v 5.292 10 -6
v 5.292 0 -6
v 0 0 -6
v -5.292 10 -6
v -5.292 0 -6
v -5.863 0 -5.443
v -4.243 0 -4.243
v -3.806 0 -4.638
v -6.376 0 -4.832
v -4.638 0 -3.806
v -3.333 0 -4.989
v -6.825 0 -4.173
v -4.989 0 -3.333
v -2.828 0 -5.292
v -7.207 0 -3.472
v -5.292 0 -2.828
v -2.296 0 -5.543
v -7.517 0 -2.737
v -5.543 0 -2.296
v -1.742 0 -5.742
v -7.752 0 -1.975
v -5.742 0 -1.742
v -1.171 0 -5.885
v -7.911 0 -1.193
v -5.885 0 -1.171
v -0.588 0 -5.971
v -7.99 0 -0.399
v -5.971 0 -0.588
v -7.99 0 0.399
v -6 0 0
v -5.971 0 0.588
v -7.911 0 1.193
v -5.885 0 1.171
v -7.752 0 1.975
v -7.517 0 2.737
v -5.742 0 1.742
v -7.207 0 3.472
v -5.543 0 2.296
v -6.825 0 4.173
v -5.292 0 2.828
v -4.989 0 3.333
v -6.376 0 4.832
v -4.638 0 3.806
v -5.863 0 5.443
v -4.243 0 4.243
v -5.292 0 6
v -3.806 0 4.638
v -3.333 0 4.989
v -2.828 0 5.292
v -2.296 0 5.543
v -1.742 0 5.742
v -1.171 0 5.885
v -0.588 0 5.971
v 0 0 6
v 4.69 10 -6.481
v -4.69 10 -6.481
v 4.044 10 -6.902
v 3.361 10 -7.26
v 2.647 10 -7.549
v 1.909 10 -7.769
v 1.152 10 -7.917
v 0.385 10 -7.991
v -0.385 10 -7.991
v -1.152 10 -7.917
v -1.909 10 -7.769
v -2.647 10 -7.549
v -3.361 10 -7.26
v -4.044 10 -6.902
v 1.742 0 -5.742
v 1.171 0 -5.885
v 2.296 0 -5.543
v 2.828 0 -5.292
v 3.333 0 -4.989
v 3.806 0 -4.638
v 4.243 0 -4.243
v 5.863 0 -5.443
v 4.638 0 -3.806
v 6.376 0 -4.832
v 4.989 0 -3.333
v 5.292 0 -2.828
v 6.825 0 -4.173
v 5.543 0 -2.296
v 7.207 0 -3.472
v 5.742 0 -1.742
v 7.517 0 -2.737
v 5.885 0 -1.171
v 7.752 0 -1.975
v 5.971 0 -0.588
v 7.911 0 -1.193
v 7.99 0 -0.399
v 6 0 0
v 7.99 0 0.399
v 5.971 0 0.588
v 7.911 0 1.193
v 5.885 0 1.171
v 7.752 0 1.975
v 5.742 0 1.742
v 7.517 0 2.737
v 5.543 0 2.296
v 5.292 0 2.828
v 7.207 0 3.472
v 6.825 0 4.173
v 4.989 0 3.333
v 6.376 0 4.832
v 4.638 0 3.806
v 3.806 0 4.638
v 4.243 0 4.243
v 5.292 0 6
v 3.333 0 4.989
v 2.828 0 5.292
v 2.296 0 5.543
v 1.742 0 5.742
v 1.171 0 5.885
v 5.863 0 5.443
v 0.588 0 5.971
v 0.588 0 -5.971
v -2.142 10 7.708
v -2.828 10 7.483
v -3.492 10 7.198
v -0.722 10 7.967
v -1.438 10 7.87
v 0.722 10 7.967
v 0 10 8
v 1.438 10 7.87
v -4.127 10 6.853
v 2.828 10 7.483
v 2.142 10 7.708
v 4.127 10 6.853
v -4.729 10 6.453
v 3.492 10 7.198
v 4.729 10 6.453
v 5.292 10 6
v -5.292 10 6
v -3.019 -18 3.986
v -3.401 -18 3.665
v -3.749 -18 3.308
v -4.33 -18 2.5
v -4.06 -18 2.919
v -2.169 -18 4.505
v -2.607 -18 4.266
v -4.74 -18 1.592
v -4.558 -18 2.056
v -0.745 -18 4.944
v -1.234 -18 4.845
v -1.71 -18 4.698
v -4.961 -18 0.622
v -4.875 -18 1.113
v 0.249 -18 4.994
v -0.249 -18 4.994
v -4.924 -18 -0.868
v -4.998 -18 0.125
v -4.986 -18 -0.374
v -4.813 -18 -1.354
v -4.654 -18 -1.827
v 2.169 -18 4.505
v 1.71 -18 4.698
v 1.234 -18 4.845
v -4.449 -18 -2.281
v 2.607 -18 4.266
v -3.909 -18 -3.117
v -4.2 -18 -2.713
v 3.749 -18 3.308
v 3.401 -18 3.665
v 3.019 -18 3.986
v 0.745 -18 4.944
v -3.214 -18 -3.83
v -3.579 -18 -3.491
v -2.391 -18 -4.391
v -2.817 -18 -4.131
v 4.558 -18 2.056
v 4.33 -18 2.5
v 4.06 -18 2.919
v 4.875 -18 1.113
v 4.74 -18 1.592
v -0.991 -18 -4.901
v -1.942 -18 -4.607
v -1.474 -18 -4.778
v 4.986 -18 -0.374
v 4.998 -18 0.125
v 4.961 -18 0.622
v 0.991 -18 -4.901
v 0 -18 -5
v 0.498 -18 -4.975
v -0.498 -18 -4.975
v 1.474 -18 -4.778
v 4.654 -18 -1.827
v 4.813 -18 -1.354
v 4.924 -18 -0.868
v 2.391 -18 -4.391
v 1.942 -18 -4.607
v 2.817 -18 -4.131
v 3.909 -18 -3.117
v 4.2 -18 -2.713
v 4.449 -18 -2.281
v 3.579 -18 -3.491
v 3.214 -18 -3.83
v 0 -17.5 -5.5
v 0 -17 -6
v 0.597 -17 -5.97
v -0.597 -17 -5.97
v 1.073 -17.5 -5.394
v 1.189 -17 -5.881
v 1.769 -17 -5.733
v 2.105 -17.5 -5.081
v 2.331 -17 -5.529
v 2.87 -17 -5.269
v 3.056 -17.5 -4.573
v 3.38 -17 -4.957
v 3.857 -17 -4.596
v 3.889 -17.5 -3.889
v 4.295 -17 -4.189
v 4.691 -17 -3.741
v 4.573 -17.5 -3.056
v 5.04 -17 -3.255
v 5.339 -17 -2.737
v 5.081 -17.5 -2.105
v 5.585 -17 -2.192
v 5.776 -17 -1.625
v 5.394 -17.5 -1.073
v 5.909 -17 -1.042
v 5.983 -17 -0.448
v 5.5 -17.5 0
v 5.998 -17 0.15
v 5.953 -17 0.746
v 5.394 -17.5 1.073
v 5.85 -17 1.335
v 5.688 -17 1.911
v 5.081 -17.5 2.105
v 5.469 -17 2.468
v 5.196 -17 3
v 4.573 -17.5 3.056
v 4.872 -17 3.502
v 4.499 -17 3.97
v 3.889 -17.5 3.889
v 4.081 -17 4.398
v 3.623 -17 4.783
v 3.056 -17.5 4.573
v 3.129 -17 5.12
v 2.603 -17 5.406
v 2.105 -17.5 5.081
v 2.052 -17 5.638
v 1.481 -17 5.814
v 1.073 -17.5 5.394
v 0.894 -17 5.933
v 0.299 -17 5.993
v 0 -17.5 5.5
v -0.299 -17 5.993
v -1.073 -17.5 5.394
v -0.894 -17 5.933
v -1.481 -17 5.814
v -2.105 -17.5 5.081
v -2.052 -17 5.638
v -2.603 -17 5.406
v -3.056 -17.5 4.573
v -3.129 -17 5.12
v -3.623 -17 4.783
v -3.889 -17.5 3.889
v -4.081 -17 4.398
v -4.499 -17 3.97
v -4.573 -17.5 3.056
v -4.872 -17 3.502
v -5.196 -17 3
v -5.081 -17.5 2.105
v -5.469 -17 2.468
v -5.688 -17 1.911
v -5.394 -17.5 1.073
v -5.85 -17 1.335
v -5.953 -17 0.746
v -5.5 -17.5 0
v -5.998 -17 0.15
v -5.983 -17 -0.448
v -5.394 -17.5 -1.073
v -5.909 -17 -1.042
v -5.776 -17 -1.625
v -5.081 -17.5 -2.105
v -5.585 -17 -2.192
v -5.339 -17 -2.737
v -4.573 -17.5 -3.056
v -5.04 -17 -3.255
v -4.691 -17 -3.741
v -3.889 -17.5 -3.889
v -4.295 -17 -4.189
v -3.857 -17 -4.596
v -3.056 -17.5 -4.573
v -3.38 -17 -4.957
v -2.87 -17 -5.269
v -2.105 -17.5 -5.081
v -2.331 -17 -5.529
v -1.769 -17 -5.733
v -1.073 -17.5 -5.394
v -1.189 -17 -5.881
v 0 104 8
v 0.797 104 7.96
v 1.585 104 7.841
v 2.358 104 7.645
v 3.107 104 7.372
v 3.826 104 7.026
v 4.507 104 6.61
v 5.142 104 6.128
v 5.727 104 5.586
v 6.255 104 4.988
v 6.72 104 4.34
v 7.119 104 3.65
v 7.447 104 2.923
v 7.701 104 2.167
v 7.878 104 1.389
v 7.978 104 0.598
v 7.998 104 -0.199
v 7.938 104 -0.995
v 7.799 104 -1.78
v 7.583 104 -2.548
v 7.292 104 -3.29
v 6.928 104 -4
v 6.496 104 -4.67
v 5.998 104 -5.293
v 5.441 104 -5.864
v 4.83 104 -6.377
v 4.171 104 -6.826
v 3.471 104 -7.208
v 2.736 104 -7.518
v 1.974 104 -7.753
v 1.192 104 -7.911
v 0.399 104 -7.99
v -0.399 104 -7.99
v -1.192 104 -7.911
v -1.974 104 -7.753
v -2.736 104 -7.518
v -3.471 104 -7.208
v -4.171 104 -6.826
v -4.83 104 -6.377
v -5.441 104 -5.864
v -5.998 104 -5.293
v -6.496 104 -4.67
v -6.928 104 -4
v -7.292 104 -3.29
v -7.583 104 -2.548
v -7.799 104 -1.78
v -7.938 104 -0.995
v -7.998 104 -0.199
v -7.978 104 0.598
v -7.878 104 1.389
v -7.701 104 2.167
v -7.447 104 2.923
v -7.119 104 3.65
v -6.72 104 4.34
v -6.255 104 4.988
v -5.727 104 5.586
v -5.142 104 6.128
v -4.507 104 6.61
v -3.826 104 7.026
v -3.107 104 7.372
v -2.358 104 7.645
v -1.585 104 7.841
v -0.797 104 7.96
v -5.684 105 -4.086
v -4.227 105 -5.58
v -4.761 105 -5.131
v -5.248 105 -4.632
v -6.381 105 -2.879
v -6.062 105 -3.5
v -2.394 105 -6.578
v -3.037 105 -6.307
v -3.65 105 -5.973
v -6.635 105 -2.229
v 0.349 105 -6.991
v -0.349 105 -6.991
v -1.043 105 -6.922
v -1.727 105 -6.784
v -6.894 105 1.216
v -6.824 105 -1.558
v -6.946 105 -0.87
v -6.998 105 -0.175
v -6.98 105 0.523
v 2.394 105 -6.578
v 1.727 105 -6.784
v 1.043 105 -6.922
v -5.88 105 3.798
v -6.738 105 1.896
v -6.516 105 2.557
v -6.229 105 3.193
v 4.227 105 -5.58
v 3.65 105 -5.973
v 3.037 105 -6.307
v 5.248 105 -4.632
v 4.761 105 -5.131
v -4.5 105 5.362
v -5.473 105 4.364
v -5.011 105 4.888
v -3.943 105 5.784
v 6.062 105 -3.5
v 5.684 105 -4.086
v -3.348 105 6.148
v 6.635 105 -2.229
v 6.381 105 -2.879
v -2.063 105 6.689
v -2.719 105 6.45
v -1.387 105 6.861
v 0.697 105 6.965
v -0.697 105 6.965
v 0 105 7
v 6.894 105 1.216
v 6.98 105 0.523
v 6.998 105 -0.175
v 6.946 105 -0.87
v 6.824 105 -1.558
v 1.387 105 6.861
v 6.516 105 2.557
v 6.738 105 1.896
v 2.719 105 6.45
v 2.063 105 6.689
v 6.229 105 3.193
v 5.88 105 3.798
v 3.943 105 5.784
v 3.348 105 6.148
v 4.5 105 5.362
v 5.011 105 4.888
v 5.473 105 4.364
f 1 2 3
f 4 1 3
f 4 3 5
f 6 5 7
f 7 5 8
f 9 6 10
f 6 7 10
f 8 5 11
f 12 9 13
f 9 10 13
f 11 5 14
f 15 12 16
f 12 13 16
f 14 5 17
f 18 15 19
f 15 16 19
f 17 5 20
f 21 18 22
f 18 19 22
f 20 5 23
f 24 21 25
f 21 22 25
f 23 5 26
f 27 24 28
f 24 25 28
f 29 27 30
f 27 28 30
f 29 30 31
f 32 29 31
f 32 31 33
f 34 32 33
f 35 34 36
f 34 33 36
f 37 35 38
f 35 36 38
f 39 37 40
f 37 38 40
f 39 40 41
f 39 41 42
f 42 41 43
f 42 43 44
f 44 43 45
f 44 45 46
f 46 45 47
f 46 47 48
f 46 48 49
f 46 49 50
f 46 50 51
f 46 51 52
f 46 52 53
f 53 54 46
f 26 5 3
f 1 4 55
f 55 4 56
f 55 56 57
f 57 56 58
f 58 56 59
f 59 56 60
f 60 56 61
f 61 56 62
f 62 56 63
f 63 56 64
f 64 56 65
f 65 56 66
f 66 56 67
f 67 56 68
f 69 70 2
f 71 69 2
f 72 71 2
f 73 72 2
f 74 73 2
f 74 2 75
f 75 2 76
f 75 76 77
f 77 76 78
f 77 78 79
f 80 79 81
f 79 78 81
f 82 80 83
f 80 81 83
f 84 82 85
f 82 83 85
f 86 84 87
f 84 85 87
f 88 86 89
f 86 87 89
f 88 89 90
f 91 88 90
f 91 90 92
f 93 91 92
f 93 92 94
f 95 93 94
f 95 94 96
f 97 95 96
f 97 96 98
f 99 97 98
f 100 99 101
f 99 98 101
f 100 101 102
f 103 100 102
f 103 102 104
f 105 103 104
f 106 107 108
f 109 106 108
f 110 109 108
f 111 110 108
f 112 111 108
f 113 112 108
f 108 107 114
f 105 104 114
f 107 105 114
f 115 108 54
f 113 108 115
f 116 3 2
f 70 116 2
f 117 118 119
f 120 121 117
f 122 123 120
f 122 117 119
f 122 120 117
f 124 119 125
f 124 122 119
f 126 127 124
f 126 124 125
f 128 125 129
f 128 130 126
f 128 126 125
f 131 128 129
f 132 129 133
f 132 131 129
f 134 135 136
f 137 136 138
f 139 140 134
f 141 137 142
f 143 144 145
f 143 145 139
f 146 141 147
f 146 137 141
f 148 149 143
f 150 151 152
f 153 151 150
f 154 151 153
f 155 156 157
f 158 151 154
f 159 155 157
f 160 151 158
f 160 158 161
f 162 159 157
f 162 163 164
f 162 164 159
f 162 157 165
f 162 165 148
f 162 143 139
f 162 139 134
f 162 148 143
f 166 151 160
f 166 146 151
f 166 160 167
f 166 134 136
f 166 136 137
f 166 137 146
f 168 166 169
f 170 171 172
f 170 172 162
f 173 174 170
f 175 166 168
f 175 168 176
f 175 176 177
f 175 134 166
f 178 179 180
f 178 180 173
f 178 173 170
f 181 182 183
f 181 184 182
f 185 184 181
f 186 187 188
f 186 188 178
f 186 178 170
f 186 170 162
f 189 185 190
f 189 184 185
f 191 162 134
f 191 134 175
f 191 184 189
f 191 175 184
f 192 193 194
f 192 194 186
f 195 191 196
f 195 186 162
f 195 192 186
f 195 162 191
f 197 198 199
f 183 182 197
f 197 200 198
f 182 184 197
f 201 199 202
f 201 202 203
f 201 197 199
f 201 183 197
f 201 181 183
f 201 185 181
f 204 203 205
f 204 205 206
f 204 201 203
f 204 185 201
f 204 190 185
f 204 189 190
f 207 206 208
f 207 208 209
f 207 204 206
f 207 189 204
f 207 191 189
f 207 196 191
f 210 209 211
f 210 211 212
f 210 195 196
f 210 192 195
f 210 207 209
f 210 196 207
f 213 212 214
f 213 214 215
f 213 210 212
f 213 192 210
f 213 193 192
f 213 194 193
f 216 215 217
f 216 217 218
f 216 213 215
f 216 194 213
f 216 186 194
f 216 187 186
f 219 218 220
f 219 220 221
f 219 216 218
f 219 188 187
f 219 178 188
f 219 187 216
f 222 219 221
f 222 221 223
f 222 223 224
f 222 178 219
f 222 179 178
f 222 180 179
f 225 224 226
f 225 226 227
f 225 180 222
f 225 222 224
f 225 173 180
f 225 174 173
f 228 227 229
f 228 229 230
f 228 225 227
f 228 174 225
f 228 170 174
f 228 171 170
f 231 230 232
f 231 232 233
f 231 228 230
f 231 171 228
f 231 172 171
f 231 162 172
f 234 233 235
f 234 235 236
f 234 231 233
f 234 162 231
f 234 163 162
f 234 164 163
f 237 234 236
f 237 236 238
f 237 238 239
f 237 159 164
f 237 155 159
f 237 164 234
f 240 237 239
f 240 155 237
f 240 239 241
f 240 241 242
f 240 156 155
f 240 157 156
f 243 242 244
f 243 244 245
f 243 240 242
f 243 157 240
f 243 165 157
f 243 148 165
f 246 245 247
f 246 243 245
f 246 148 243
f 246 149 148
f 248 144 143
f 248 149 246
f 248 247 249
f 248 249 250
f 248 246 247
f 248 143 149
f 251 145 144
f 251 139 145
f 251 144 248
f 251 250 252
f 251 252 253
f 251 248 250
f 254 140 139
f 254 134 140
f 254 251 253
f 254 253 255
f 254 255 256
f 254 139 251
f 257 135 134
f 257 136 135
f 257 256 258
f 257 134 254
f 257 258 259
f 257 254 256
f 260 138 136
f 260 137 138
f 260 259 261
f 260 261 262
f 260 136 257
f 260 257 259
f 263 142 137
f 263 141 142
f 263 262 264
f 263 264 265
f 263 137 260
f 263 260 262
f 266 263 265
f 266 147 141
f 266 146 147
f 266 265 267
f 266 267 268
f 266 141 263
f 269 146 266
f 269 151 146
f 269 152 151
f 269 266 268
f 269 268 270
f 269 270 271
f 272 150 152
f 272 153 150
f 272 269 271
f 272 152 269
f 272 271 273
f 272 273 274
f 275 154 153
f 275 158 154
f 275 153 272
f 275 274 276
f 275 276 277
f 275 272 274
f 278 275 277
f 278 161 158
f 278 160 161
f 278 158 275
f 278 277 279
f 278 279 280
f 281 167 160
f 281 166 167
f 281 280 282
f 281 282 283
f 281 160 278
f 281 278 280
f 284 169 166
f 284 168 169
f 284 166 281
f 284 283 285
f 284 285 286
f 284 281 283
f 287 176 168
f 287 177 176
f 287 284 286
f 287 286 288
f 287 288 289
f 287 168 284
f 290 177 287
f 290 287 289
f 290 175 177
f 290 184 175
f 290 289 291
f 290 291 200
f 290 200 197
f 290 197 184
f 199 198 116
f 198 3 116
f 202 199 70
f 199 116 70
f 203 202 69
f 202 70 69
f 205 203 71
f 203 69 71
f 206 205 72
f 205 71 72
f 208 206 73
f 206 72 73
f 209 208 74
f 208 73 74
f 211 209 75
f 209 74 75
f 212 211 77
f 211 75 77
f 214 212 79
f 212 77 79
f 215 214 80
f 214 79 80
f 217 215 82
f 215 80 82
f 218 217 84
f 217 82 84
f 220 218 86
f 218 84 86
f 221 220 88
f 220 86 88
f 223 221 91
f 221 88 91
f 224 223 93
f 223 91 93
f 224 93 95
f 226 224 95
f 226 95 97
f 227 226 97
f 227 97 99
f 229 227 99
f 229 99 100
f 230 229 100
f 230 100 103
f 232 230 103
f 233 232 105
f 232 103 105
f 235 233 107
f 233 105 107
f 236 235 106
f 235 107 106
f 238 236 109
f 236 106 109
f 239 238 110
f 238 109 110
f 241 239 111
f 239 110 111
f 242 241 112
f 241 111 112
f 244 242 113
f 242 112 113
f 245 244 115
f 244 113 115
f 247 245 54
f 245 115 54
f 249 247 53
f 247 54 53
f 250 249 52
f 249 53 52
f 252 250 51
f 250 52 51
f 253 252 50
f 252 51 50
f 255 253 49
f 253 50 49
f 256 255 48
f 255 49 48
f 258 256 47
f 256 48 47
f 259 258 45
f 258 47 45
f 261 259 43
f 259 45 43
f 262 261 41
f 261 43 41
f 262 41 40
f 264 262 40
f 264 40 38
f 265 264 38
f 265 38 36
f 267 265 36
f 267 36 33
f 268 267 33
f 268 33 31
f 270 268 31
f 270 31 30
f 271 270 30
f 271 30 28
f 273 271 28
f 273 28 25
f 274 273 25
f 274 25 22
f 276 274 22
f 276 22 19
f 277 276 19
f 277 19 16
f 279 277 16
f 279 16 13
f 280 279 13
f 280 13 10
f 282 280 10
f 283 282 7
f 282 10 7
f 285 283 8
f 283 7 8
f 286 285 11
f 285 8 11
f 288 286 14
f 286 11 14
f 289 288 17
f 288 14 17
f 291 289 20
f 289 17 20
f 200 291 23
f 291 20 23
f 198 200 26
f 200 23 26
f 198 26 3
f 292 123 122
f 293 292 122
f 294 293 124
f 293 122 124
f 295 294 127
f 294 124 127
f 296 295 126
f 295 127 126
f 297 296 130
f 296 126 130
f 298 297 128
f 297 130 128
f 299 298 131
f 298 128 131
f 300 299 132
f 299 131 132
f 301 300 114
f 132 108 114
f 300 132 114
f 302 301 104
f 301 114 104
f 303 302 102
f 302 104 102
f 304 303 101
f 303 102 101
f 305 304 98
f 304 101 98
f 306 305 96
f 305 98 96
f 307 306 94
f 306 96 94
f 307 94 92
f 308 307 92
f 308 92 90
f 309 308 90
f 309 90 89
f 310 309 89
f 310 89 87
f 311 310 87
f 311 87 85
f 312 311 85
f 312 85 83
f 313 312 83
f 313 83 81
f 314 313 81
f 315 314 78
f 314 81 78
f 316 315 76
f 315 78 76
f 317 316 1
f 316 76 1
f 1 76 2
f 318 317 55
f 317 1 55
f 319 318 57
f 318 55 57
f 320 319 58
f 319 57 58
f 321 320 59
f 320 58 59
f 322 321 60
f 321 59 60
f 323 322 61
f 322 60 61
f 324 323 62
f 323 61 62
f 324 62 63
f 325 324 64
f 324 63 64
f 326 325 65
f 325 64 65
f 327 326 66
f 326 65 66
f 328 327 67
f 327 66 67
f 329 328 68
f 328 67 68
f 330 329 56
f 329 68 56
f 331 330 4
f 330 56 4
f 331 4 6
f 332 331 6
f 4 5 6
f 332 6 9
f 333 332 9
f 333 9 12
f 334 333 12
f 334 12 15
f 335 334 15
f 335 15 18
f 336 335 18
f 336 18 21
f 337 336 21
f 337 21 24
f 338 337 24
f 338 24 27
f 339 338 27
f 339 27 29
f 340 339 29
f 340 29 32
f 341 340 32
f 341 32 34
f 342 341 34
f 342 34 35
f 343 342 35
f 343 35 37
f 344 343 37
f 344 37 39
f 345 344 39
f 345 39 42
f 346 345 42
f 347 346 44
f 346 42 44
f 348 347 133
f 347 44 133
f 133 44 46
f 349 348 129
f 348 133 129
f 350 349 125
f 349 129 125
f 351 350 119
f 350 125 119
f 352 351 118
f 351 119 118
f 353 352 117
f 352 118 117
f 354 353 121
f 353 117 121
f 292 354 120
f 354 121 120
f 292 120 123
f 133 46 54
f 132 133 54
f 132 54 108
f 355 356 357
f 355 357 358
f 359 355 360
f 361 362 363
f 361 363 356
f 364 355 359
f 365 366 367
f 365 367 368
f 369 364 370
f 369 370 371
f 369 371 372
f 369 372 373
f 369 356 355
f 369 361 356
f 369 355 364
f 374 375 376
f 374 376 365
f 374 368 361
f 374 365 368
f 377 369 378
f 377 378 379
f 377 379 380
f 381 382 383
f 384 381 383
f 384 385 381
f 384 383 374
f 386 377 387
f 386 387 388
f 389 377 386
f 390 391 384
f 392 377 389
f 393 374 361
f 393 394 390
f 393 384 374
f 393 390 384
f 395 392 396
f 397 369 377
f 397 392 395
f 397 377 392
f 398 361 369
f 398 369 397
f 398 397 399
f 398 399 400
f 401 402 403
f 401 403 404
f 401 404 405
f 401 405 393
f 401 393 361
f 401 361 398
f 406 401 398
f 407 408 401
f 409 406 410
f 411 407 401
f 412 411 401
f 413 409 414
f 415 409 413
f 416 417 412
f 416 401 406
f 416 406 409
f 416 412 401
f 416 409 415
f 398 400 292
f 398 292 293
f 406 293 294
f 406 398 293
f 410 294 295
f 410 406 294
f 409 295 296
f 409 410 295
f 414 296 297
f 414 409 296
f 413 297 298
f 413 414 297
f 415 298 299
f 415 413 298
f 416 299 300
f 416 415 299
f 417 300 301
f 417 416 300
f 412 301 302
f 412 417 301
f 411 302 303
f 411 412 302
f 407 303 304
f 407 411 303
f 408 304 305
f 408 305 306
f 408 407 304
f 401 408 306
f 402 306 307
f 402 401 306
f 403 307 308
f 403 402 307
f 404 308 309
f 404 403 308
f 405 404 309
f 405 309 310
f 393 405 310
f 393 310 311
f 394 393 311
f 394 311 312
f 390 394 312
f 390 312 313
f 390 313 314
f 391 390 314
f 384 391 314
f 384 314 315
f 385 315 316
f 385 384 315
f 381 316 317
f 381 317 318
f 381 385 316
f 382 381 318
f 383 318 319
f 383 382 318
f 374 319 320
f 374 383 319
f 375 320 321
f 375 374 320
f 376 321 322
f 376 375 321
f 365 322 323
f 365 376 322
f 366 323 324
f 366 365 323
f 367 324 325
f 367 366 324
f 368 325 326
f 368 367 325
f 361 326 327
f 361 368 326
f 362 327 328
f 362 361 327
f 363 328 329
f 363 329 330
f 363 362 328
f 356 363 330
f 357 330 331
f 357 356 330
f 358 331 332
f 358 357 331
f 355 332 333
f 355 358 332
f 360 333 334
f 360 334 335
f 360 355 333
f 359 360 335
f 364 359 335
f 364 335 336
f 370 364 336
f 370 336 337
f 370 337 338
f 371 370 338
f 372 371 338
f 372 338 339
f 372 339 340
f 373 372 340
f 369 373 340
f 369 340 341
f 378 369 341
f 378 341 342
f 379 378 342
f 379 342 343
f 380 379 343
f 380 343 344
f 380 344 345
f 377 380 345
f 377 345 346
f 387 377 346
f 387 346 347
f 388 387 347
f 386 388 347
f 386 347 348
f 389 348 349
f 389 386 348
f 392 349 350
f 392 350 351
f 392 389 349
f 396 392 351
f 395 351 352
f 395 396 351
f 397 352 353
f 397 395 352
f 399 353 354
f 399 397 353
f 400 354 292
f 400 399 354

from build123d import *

# Parameters (mm, degrees)
ESBO_O1_R                = 8
RESSALTO_EXTRUS_O1_DEPTH = 105
ESBO_O2_R                = 6
RESSALTO_EXTRUS_O2_DEPTH = 18
CHANFRO1_SIZE            = 1
ESBO_O3_OUTSIDE_W        = 43.012
ESBO_O3_OUTSIDE_H        = 43.012
CORTE_EXTRUS_O1_DEPTH    = 10


with BuildPart() as part:
    # Esboço1 → Ressalto-extrusão1 (new body)
    with BuildSketch(Plane(origin=(0, 0, 0), x_dir=(1, 0, 0), z_dir=(0, 1, 0))):
        with Locations(Location((0, 0, 0), (0, 0, 270))):  # turned: the seam where the file's is
            Circle(ESBO_O1_R)
    extrude(amount=RESSALTO_EXTRUS_O1_DEPTH)

    # Esboço2 → Ressalto-extrusão2 (add)
    with BuildSketch(Plane.XZ):
        with Locations(Location((0, 0, 0), (0, 0, 270))):  # turned: the seam where the file's is
            Circle(ESBO_O2_R)
    extrude(amount=RESSALTO_EXTRUS_O2_DEPTH)

    # Chanfro1
    chanfro1_edges = [part.edges().sort_by_distance(p)[0] for p in [
        (0, 105, -8),
        (0, -18, 6),
    ]]
    chamfer(chanfro1_edges, length=CHANFRO1_SIZE)

    # Esboço3 outside → Corte-extrusão1 (cut)
    with BuildSketch(Plane.XZ):
        Rectangle(ESBO_O3_OUTSIDE_W, ESBO_O3_OUTSIDE_H)
        with BuildLine():
            Line((-8, 6), (8, 6))
            ThreePointArc((8, 6), (14, 0), (8, -6))
            Line((8, -6), (-8, -6))
            ThreePointArc((-8, -6), (-14, 0), (-8, 6))
        make_face(mode=Mode.SUBTRACT)
    extrude(amount=-CORTE_EXTRUS_O1_DEPTH, mode=Mode.SUBTRACT)


solid = part.part
